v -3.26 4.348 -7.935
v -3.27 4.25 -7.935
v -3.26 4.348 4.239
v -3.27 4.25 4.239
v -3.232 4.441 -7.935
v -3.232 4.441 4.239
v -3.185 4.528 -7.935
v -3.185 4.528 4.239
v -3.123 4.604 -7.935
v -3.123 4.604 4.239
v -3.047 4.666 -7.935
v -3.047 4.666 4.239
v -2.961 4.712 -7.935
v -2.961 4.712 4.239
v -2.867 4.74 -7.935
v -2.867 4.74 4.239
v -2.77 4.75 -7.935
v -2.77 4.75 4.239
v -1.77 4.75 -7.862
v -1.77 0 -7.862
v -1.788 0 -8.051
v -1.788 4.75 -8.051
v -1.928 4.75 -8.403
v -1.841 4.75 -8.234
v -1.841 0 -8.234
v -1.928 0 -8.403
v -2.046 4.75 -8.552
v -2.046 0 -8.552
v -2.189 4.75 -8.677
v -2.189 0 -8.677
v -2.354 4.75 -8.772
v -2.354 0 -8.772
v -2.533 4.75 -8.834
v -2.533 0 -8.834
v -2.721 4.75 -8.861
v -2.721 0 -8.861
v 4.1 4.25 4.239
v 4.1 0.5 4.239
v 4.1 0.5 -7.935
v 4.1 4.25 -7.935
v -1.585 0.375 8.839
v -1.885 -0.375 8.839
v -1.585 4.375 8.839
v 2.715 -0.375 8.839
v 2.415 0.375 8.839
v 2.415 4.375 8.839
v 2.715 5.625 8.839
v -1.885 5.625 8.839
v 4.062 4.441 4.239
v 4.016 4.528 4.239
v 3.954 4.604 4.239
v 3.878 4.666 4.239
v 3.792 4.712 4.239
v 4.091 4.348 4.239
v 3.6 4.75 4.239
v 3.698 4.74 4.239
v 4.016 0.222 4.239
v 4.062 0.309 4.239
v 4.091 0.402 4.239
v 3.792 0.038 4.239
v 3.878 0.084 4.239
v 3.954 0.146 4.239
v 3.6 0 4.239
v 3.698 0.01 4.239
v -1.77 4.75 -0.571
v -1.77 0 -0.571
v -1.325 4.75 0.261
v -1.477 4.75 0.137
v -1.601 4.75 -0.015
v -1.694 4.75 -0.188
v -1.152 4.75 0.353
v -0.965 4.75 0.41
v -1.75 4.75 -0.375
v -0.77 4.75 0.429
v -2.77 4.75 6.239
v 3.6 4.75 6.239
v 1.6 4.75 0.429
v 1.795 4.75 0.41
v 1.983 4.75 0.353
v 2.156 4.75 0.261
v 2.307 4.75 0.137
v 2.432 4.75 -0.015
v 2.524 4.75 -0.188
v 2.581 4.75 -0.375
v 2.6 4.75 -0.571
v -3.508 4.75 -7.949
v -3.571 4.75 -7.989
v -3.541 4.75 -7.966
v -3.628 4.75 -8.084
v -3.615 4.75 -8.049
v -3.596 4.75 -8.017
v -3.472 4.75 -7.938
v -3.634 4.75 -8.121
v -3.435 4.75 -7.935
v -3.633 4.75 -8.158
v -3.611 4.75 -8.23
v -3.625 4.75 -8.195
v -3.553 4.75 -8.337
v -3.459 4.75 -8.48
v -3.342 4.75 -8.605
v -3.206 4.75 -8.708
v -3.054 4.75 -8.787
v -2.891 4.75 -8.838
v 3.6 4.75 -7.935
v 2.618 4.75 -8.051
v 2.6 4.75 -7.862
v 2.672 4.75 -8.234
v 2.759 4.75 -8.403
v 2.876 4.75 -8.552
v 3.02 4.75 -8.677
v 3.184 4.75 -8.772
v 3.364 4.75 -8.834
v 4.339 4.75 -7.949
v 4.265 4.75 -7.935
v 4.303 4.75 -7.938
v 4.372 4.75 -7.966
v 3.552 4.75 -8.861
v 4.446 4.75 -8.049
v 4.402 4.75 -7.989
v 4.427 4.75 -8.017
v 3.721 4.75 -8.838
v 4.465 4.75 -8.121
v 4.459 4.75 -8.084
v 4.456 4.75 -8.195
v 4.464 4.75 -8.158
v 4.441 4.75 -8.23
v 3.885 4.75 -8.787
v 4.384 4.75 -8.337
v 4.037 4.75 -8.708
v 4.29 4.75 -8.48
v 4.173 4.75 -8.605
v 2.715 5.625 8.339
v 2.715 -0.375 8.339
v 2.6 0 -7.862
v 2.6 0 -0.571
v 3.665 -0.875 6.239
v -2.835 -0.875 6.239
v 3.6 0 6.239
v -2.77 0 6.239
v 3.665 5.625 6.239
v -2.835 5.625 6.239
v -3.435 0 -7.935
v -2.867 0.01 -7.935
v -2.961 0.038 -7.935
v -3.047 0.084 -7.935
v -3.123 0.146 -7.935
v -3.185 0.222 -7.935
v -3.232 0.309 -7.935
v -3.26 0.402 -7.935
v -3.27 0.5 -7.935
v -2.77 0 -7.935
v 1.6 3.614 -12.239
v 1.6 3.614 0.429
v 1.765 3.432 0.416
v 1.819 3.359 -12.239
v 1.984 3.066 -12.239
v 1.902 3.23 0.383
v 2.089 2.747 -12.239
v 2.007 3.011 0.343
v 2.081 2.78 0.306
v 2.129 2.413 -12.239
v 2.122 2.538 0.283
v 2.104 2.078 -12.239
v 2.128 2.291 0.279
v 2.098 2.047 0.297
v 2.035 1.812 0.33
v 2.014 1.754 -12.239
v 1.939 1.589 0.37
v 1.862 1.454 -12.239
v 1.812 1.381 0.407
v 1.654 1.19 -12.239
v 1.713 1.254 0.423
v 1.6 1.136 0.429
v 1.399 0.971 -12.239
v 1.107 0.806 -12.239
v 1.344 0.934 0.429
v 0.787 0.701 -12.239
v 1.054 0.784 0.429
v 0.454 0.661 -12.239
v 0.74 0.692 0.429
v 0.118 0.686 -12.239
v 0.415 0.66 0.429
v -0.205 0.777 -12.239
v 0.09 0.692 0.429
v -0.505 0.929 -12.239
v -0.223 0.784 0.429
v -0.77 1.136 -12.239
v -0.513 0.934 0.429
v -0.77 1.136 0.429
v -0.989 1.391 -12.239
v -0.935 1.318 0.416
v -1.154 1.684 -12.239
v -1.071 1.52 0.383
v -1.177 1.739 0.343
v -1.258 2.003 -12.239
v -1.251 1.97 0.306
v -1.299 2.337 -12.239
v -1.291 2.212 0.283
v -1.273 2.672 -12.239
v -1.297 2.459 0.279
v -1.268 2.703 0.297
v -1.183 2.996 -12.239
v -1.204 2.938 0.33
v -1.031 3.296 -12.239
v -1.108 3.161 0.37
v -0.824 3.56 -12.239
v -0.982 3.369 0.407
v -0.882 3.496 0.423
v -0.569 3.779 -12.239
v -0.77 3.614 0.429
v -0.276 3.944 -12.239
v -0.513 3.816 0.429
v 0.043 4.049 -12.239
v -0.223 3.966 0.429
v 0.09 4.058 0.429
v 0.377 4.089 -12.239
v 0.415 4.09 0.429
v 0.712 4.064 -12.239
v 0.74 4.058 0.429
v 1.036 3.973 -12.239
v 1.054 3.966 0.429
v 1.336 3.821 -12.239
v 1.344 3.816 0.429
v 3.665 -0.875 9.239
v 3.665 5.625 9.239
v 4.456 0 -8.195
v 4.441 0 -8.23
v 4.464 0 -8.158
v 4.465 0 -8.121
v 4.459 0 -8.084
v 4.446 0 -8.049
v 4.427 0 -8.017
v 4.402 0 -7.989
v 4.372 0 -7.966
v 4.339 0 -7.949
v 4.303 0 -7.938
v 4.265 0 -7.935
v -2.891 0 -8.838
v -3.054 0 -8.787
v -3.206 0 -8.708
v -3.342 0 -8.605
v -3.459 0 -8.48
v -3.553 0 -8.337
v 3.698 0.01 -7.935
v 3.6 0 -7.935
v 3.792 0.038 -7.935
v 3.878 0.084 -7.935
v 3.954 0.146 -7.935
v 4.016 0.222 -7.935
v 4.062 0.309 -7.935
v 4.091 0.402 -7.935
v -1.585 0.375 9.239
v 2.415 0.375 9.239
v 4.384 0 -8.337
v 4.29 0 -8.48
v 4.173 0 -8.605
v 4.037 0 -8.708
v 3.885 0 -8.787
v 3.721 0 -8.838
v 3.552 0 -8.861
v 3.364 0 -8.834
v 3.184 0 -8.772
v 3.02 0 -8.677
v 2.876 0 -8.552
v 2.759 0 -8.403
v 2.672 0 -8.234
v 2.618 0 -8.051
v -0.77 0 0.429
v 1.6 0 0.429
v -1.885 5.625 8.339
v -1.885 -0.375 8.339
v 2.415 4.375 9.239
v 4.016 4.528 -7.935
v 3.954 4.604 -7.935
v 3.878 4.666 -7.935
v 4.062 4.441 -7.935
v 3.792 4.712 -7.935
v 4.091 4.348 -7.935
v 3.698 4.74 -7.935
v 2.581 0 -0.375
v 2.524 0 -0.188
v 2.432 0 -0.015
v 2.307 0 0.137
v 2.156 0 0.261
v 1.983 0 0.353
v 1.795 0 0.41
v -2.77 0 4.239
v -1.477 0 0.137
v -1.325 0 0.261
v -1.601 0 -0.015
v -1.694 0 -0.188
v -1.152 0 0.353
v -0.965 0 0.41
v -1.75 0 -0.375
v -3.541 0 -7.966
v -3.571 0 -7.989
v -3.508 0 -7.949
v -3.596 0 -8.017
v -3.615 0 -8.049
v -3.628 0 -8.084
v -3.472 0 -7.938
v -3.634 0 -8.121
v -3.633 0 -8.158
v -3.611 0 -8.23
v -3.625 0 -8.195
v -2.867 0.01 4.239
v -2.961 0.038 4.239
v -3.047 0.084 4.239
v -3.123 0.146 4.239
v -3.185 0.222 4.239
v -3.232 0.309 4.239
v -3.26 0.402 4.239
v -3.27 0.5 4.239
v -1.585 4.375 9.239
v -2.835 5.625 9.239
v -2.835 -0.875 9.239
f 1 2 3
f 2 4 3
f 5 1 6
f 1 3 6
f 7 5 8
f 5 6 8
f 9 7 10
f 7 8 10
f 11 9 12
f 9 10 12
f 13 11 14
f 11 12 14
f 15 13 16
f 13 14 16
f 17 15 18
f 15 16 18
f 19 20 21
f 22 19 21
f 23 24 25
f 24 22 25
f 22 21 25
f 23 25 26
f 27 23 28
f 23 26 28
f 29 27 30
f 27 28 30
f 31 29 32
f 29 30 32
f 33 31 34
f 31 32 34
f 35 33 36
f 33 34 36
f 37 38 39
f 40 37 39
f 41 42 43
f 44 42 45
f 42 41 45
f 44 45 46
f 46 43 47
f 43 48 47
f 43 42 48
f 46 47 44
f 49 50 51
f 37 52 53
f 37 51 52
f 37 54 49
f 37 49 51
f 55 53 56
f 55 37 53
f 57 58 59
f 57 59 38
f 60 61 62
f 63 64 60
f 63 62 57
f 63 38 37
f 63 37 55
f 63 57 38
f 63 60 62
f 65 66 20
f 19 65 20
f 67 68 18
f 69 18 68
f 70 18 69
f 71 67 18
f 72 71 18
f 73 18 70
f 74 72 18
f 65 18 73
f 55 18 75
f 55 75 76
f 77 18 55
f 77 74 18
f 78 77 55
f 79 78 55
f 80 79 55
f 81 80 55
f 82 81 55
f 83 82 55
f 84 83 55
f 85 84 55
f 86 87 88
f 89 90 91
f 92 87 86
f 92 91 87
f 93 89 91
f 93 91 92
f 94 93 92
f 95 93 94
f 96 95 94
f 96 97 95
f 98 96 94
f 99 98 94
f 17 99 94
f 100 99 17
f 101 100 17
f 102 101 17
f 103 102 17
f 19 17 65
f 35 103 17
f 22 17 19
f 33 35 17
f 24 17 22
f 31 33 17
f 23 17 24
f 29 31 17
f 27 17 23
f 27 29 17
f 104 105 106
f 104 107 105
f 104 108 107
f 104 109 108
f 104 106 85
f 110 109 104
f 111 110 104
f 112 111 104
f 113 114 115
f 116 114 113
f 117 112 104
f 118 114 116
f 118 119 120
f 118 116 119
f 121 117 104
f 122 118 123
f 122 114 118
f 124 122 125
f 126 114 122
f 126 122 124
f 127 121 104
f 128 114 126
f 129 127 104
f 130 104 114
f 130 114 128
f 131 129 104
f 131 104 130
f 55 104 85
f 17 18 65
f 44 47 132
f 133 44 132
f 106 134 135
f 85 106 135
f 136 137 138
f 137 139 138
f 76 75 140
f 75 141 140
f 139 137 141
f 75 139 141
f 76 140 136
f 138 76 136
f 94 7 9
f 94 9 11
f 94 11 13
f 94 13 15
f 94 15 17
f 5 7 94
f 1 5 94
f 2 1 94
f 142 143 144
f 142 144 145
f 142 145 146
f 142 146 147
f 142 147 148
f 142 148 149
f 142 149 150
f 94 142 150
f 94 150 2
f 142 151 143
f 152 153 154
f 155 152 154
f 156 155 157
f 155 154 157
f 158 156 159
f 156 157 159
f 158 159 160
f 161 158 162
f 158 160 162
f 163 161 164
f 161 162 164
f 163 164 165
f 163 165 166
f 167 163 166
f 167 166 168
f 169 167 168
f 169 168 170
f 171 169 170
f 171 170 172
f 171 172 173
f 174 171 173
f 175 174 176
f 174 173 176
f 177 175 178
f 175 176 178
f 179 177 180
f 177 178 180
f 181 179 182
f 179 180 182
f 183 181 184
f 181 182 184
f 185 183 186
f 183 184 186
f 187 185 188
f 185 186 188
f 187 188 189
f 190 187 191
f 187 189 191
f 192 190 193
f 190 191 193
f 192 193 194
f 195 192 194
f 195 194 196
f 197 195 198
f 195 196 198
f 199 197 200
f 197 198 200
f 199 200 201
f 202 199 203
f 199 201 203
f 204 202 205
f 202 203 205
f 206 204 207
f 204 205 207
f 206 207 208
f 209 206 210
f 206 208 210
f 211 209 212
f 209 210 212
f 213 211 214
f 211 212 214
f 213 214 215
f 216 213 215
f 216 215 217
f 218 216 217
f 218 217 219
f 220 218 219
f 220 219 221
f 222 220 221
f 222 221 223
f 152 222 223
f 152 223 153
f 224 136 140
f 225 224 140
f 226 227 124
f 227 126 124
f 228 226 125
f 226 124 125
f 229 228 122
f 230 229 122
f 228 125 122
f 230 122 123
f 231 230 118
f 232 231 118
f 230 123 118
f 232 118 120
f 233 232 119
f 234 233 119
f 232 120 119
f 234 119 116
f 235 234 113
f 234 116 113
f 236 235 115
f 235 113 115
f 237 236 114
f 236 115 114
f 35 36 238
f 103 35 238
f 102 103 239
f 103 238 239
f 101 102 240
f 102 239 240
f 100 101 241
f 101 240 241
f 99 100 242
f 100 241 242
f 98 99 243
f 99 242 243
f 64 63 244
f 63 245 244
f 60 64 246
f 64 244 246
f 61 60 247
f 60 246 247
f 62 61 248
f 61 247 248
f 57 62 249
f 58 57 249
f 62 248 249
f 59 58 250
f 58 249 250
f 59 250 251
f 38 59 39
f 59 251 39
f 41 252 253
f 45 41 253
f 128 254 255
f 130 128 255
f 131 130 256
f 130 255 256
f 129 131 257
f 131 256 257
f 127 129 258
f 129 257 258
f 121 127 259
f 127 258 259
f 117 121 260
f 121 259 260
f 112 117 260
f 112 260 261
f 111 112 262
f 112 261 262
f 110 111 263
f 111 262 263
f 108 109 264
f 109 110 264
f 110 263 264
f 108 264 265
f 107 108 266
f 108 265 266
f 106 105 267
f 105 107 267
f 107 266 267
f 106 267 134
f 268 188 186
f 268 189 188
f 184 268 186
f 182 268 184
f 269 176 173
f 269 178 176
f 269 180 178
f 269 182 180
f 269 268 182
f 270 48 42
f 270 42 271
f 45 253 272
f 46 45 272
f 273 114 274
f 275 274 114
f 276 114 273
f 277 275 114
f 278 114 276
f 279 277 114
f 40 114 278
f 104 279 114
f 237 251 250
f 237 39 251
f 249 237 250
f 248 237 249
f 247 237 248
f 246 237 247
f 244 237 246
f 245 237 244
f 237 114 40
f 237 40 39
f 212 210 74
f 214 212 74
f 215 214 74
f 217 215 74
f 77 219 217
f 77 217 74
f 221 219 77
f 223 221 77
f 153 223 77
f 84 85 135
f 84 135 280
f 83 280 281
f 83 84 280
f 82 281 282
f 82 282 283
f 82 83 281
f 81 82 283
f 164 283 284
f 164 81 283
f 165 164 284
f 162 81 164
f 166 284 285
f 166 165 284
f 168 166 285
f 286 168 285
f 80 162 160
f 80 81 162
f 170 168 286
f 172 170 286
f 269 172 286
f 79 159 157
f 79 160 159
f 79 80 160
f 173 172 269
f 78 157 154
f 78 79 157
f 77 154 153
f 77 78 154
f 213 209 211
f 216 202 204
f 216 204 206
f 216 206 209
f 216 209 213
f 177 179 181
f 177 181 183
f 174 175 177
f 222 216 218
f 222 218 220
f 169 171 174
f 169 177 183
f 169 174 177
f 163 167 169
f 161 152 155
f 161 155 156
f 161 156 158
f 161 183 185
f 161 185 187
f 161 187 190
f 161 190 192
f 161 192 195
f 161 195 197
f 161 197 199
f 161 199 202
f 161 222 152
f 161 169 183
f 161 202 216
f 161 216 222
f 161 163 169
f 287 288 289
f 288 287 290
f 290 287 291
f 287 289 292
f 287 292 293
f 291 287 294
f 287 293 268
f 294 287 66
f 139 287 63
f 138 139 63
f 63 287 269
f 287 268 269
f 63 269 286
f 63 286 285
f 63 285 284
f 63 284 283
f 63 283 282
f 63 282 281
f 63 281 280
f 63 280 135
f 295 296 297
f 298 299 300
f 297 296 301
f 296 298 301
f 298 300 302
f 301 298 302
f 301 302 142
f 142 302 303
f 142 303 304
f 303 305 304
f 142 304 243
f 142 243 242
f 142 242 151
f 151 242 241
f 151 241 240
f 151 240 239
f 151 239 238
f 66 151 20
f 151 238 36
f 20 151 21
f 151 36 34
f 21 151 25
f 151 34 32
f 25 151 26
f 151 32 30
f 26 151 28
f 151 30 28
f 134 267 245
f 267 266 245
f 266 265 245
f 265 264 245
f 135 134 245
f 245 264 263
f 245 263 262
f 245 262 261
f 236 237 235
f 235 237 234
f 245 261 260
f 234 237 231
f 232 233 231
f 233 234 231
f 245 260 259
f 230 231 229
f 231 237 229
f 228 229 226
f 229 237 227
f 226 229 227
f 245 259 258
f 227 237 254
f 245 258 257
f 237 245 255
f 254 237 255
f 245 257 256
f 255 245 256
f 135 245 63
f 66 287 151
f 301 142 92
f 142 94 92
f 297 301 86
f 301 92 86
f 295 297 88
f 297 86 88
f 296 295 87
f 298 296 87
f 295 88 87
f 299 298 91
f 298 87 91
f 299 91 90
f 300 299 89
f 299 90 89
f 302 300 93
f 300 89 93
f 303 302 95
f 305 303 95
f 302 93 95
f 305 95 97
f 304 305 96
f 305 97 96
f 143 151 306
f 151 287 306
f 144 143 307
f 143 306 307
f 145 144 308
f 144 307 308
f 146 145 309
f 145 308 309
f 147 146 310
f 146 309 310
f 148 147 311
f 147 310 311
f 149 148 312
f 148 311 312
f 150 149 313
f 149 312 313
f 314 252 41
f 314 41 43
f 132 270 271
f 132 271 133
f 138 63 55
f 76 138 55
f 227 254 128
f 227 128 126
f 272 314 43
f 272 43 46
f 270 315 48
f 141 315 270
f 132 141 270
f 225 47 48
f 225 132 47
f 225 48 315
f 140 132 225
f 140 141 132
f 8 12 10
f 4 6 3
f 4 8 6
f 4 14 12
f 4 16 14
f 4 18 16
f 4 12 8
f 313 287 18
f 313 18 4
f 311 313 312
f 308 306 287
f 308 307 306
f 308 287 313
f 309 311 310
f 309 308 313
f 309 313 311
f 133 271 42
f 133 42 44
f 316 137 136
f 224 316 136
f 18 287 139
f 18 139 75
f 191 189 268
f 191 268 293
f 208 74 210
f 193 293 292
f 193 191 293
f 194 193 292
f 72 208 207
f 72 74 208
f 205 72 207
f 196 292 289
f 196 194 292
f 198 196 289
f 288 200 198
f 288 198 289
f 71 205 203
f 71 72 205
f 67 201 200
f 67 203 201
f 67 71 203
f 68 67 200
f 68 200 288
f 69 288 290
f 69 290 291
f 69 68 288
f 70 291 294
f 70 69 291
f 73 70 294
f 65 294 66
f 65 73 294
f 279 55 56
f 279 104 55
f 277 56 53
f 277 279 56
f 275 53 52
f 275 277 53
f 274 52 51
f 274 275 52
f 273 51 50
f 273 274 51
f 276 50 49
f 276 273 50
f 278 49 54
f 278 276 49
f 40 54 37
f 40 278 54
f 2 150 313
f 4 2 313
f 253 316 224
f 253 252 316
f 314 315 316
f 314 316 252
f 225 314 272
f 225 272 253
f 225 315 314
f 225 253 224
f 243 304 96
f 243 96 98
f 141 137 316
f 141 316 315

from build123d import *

# Parameters (mm, degrees)
BOSS_EXTRUDE1_DEPTH = 4.75
FILLET2_R           = 0.2
FILLET3_R           = 1
FILLET5_R           = 0.5
FILLET6_R           = 1
SKETCH3_W           = 6.37
SKETCH3_H           = 4.75
BOSS_EXTRUDE2_DEPTH = 2
SKETCH4_W           = 6.5
SKETCH4_H           = 6.5
BOSS_EXTRUDE3_DEPTH = 3
SKETCH5_W           = 4.6
SKETCH5_H           = 0.5
CUT_EXTRUDE1_DEPTH  = 6
SKETCH8_W           = 4
SKETCH8_H           = 4
CUT_EXTRUDE2_DEPTH  = 0.5
SKETCH9_R           = 1.7145
BOSS_EXTRUDE4_DEPTH = 12.668


with BuildPart() as part:
    # Sketch2 → Boss-Extrude1 (new body)
    with BuildSketch(Plane(origin=(0, 0, 0), x_dir=(1, 0, 0), z_dir=(0, 1, 0))):
        Polygon((-3.269672992, 3.380584559), (-3.269672992, 7.934769302), (-3.769672992, 7.934769302), (-3.269672992, 8.862323318), (-1.769672992, 8.862323318), (-1.769672992, 3.380584559), (-1.769672992, -0.429415441), (2.600327008, -0.429415441), (2.600327008, 3.380584559), (2.600327008, 8.862323318), (4.100327008, 8.862323318), (4.600327008, 7.934769302), (4.100327008, 7.934769302), (4.100327008, 5.316430627), (4.100327008, -4.239415441), (-3.269672992, -4.239415441), align=None)
    extrude(amount=BOSS_EXTRUDE1_DEPTH)

    # Fillet2
    fillet2_edges = [part.edges().sort_by_distance(p)[0] for p in [
        (-3.769672992, 2.375, -7.934769302),
        (4.600327008, 2.375, -7.934769302),
    ]]
    fillet(fillet2_edges, radius=FILLET2_R)

    # Fillet3
    # the kernel refuses this fillet: 1 mm, written as the material it takes off along each edge
    with BuildSketch(Plane(origin=(-1.769672992, -2.5, -8.862323318), x_dir=(-1, 0, 0), z_dir=(0, 1, 0)), Plane(origin=(2.600327008, -2.5, -8.862323318), x_dir=(0, 0, 1), z_dir=(0, 1, 0))) as fillet3_piece_1:
        with BuildLine():
            CenterArc((FILLET3_R, FILLET3_R), FILLET3_R, 180, 90)
            Line((0, FILLET3_R), (0, 0))
            Line((0, 0), (FILLET3_R, 0))
        make_face()
    extrude(amount=9.75, mode=Mode.SUBTRACT)
    with BuildSketch(Plane(origin=(4.100327008, -1.492458976, -8.862323318), x_dir=(0.47450281579704723, 0, 0.8802539848252171), z_dir=(0, 1, 0))) as fillet3_piece_2:
        with BuildLine():
            CenterArc((FILLET3_R * 0.596983590262, -FILLET3_R), FILLET3_R, 90, 61.673016648)
            Line((-FILLET3_R * 0.283270394564, -FILLET3_R * 0.525497184203), (0, 0))
            Line((0, 0), (FILLET3_R * 0.596983590262, 0))
        make_face()
    extrude(amount=7.734917951, mode=Mode.SUBTRACT)
    with BuildSketch(Plane(origin=(-3.269672992, -1.492458976, -8.862323318), x_dir=(-0.474502815797046, 0, 0.8802539848252178), z_dir=(0, 1, 0))) as fillet3_piece_3:
        with BuildLine():
            CenterArc((FILLET3_R * 0.596983590262, FILLET3_R), FILLET3_R, 208.326983352, 61.673016648)
            Line((-FILLET3_R * 0.283270394564, FILLET3_R * 0.525497184203), (0, 0))
            Line((0, 0), (FILLET3_R * 0.596983590262, 0))
        make_face()
    extrude(amount=7.734917951, mode=Mode.SUBTRACT)

    # Fillet5
    fillet5_edges = [part.edges().sort_by_distance(p)[0] for p in [
        (-3.269672992, 0, -1.84767693),
        (4.100327008, 0, -1.84767693),
        (4.100327008, 4.75, -1.84767693),
        (-3.269672992, 4.75, -1.84767693),
    ]]
    fillet(fillet5_edges, radius=FILLET5_R)

    # Fillet6
    fillet6_edges = [part.edges().sort_by_distance(p)[0] for p in [
        (-1.769672992, 2.375, 0.429415441),
        (2.600327008, 2.375, 0.429415441),
    ]]
    fillet(fillet6_edges, radius=FILLET6_R)

    # Sketch3 → Boss-Extrude2 (add)
    with BuildSketch(Plane.XY.offset(4.239415441)):
        with Locations((0.415327008, 2.375)):
            Rectangle(SKETCH3_W, SKETCH3_H)
    extrude(amount=BOSS_EXTRUDE2_DEPTH)

    # Sketch4 → Boss-Extrude3 (add)
    with BuildSketch(Plane.XY.offset(6.239415441)):
        with Locations((0.415327008, 2.375)):
            Rectangle(SKETCH4_W, SKETCH4_H)
    extrude(amount=BOSS_EXTRUDE3_DEPTH)

    # Sketch5 → Cut-Extrude1 (cut)
    with BuildSketch(Plane(origin=(0, 5.625, 0), x_dir=(1, 0, 0), z_dir=(0, 1, 0))):
        with Locations((0.415327008, -8.589415441)):
            Rectangle(SKETCH5_W, SKETCH5_H)
    extrude(amount=-CUT_EXTRUDE1_DEPTH, mode=Mode.SUBTRACT)

    # Sketch8 → Cut-Extrude2 (cut)
    with BuildSketch(Plane.XY.offset(9.239415441)):
        with Locations((0.415327008, 2.375)):
            Rectangle(SKETCH8_W, SKETCH8_H)
    extrude(amount=-CUT_EXTRUDE2_DEPTH, mode=Mode.SUBTRACT)

    # Sketch9 → Boss-Extrude4 (add)
    with BuildSketch(Plane(origin=(0, 0, 0.429415441), x_dir=(-1, 0, 0), z_dir=(0, 0, -1))):
        with Locations(Location((-0.415327008, 2.375, 0), (0, 0, 133.722288973))):
            Circle(SKETCH9_R)
    extrude(amount=BOSS_EXTRUDE4_DEPTH)


solid = part.part
